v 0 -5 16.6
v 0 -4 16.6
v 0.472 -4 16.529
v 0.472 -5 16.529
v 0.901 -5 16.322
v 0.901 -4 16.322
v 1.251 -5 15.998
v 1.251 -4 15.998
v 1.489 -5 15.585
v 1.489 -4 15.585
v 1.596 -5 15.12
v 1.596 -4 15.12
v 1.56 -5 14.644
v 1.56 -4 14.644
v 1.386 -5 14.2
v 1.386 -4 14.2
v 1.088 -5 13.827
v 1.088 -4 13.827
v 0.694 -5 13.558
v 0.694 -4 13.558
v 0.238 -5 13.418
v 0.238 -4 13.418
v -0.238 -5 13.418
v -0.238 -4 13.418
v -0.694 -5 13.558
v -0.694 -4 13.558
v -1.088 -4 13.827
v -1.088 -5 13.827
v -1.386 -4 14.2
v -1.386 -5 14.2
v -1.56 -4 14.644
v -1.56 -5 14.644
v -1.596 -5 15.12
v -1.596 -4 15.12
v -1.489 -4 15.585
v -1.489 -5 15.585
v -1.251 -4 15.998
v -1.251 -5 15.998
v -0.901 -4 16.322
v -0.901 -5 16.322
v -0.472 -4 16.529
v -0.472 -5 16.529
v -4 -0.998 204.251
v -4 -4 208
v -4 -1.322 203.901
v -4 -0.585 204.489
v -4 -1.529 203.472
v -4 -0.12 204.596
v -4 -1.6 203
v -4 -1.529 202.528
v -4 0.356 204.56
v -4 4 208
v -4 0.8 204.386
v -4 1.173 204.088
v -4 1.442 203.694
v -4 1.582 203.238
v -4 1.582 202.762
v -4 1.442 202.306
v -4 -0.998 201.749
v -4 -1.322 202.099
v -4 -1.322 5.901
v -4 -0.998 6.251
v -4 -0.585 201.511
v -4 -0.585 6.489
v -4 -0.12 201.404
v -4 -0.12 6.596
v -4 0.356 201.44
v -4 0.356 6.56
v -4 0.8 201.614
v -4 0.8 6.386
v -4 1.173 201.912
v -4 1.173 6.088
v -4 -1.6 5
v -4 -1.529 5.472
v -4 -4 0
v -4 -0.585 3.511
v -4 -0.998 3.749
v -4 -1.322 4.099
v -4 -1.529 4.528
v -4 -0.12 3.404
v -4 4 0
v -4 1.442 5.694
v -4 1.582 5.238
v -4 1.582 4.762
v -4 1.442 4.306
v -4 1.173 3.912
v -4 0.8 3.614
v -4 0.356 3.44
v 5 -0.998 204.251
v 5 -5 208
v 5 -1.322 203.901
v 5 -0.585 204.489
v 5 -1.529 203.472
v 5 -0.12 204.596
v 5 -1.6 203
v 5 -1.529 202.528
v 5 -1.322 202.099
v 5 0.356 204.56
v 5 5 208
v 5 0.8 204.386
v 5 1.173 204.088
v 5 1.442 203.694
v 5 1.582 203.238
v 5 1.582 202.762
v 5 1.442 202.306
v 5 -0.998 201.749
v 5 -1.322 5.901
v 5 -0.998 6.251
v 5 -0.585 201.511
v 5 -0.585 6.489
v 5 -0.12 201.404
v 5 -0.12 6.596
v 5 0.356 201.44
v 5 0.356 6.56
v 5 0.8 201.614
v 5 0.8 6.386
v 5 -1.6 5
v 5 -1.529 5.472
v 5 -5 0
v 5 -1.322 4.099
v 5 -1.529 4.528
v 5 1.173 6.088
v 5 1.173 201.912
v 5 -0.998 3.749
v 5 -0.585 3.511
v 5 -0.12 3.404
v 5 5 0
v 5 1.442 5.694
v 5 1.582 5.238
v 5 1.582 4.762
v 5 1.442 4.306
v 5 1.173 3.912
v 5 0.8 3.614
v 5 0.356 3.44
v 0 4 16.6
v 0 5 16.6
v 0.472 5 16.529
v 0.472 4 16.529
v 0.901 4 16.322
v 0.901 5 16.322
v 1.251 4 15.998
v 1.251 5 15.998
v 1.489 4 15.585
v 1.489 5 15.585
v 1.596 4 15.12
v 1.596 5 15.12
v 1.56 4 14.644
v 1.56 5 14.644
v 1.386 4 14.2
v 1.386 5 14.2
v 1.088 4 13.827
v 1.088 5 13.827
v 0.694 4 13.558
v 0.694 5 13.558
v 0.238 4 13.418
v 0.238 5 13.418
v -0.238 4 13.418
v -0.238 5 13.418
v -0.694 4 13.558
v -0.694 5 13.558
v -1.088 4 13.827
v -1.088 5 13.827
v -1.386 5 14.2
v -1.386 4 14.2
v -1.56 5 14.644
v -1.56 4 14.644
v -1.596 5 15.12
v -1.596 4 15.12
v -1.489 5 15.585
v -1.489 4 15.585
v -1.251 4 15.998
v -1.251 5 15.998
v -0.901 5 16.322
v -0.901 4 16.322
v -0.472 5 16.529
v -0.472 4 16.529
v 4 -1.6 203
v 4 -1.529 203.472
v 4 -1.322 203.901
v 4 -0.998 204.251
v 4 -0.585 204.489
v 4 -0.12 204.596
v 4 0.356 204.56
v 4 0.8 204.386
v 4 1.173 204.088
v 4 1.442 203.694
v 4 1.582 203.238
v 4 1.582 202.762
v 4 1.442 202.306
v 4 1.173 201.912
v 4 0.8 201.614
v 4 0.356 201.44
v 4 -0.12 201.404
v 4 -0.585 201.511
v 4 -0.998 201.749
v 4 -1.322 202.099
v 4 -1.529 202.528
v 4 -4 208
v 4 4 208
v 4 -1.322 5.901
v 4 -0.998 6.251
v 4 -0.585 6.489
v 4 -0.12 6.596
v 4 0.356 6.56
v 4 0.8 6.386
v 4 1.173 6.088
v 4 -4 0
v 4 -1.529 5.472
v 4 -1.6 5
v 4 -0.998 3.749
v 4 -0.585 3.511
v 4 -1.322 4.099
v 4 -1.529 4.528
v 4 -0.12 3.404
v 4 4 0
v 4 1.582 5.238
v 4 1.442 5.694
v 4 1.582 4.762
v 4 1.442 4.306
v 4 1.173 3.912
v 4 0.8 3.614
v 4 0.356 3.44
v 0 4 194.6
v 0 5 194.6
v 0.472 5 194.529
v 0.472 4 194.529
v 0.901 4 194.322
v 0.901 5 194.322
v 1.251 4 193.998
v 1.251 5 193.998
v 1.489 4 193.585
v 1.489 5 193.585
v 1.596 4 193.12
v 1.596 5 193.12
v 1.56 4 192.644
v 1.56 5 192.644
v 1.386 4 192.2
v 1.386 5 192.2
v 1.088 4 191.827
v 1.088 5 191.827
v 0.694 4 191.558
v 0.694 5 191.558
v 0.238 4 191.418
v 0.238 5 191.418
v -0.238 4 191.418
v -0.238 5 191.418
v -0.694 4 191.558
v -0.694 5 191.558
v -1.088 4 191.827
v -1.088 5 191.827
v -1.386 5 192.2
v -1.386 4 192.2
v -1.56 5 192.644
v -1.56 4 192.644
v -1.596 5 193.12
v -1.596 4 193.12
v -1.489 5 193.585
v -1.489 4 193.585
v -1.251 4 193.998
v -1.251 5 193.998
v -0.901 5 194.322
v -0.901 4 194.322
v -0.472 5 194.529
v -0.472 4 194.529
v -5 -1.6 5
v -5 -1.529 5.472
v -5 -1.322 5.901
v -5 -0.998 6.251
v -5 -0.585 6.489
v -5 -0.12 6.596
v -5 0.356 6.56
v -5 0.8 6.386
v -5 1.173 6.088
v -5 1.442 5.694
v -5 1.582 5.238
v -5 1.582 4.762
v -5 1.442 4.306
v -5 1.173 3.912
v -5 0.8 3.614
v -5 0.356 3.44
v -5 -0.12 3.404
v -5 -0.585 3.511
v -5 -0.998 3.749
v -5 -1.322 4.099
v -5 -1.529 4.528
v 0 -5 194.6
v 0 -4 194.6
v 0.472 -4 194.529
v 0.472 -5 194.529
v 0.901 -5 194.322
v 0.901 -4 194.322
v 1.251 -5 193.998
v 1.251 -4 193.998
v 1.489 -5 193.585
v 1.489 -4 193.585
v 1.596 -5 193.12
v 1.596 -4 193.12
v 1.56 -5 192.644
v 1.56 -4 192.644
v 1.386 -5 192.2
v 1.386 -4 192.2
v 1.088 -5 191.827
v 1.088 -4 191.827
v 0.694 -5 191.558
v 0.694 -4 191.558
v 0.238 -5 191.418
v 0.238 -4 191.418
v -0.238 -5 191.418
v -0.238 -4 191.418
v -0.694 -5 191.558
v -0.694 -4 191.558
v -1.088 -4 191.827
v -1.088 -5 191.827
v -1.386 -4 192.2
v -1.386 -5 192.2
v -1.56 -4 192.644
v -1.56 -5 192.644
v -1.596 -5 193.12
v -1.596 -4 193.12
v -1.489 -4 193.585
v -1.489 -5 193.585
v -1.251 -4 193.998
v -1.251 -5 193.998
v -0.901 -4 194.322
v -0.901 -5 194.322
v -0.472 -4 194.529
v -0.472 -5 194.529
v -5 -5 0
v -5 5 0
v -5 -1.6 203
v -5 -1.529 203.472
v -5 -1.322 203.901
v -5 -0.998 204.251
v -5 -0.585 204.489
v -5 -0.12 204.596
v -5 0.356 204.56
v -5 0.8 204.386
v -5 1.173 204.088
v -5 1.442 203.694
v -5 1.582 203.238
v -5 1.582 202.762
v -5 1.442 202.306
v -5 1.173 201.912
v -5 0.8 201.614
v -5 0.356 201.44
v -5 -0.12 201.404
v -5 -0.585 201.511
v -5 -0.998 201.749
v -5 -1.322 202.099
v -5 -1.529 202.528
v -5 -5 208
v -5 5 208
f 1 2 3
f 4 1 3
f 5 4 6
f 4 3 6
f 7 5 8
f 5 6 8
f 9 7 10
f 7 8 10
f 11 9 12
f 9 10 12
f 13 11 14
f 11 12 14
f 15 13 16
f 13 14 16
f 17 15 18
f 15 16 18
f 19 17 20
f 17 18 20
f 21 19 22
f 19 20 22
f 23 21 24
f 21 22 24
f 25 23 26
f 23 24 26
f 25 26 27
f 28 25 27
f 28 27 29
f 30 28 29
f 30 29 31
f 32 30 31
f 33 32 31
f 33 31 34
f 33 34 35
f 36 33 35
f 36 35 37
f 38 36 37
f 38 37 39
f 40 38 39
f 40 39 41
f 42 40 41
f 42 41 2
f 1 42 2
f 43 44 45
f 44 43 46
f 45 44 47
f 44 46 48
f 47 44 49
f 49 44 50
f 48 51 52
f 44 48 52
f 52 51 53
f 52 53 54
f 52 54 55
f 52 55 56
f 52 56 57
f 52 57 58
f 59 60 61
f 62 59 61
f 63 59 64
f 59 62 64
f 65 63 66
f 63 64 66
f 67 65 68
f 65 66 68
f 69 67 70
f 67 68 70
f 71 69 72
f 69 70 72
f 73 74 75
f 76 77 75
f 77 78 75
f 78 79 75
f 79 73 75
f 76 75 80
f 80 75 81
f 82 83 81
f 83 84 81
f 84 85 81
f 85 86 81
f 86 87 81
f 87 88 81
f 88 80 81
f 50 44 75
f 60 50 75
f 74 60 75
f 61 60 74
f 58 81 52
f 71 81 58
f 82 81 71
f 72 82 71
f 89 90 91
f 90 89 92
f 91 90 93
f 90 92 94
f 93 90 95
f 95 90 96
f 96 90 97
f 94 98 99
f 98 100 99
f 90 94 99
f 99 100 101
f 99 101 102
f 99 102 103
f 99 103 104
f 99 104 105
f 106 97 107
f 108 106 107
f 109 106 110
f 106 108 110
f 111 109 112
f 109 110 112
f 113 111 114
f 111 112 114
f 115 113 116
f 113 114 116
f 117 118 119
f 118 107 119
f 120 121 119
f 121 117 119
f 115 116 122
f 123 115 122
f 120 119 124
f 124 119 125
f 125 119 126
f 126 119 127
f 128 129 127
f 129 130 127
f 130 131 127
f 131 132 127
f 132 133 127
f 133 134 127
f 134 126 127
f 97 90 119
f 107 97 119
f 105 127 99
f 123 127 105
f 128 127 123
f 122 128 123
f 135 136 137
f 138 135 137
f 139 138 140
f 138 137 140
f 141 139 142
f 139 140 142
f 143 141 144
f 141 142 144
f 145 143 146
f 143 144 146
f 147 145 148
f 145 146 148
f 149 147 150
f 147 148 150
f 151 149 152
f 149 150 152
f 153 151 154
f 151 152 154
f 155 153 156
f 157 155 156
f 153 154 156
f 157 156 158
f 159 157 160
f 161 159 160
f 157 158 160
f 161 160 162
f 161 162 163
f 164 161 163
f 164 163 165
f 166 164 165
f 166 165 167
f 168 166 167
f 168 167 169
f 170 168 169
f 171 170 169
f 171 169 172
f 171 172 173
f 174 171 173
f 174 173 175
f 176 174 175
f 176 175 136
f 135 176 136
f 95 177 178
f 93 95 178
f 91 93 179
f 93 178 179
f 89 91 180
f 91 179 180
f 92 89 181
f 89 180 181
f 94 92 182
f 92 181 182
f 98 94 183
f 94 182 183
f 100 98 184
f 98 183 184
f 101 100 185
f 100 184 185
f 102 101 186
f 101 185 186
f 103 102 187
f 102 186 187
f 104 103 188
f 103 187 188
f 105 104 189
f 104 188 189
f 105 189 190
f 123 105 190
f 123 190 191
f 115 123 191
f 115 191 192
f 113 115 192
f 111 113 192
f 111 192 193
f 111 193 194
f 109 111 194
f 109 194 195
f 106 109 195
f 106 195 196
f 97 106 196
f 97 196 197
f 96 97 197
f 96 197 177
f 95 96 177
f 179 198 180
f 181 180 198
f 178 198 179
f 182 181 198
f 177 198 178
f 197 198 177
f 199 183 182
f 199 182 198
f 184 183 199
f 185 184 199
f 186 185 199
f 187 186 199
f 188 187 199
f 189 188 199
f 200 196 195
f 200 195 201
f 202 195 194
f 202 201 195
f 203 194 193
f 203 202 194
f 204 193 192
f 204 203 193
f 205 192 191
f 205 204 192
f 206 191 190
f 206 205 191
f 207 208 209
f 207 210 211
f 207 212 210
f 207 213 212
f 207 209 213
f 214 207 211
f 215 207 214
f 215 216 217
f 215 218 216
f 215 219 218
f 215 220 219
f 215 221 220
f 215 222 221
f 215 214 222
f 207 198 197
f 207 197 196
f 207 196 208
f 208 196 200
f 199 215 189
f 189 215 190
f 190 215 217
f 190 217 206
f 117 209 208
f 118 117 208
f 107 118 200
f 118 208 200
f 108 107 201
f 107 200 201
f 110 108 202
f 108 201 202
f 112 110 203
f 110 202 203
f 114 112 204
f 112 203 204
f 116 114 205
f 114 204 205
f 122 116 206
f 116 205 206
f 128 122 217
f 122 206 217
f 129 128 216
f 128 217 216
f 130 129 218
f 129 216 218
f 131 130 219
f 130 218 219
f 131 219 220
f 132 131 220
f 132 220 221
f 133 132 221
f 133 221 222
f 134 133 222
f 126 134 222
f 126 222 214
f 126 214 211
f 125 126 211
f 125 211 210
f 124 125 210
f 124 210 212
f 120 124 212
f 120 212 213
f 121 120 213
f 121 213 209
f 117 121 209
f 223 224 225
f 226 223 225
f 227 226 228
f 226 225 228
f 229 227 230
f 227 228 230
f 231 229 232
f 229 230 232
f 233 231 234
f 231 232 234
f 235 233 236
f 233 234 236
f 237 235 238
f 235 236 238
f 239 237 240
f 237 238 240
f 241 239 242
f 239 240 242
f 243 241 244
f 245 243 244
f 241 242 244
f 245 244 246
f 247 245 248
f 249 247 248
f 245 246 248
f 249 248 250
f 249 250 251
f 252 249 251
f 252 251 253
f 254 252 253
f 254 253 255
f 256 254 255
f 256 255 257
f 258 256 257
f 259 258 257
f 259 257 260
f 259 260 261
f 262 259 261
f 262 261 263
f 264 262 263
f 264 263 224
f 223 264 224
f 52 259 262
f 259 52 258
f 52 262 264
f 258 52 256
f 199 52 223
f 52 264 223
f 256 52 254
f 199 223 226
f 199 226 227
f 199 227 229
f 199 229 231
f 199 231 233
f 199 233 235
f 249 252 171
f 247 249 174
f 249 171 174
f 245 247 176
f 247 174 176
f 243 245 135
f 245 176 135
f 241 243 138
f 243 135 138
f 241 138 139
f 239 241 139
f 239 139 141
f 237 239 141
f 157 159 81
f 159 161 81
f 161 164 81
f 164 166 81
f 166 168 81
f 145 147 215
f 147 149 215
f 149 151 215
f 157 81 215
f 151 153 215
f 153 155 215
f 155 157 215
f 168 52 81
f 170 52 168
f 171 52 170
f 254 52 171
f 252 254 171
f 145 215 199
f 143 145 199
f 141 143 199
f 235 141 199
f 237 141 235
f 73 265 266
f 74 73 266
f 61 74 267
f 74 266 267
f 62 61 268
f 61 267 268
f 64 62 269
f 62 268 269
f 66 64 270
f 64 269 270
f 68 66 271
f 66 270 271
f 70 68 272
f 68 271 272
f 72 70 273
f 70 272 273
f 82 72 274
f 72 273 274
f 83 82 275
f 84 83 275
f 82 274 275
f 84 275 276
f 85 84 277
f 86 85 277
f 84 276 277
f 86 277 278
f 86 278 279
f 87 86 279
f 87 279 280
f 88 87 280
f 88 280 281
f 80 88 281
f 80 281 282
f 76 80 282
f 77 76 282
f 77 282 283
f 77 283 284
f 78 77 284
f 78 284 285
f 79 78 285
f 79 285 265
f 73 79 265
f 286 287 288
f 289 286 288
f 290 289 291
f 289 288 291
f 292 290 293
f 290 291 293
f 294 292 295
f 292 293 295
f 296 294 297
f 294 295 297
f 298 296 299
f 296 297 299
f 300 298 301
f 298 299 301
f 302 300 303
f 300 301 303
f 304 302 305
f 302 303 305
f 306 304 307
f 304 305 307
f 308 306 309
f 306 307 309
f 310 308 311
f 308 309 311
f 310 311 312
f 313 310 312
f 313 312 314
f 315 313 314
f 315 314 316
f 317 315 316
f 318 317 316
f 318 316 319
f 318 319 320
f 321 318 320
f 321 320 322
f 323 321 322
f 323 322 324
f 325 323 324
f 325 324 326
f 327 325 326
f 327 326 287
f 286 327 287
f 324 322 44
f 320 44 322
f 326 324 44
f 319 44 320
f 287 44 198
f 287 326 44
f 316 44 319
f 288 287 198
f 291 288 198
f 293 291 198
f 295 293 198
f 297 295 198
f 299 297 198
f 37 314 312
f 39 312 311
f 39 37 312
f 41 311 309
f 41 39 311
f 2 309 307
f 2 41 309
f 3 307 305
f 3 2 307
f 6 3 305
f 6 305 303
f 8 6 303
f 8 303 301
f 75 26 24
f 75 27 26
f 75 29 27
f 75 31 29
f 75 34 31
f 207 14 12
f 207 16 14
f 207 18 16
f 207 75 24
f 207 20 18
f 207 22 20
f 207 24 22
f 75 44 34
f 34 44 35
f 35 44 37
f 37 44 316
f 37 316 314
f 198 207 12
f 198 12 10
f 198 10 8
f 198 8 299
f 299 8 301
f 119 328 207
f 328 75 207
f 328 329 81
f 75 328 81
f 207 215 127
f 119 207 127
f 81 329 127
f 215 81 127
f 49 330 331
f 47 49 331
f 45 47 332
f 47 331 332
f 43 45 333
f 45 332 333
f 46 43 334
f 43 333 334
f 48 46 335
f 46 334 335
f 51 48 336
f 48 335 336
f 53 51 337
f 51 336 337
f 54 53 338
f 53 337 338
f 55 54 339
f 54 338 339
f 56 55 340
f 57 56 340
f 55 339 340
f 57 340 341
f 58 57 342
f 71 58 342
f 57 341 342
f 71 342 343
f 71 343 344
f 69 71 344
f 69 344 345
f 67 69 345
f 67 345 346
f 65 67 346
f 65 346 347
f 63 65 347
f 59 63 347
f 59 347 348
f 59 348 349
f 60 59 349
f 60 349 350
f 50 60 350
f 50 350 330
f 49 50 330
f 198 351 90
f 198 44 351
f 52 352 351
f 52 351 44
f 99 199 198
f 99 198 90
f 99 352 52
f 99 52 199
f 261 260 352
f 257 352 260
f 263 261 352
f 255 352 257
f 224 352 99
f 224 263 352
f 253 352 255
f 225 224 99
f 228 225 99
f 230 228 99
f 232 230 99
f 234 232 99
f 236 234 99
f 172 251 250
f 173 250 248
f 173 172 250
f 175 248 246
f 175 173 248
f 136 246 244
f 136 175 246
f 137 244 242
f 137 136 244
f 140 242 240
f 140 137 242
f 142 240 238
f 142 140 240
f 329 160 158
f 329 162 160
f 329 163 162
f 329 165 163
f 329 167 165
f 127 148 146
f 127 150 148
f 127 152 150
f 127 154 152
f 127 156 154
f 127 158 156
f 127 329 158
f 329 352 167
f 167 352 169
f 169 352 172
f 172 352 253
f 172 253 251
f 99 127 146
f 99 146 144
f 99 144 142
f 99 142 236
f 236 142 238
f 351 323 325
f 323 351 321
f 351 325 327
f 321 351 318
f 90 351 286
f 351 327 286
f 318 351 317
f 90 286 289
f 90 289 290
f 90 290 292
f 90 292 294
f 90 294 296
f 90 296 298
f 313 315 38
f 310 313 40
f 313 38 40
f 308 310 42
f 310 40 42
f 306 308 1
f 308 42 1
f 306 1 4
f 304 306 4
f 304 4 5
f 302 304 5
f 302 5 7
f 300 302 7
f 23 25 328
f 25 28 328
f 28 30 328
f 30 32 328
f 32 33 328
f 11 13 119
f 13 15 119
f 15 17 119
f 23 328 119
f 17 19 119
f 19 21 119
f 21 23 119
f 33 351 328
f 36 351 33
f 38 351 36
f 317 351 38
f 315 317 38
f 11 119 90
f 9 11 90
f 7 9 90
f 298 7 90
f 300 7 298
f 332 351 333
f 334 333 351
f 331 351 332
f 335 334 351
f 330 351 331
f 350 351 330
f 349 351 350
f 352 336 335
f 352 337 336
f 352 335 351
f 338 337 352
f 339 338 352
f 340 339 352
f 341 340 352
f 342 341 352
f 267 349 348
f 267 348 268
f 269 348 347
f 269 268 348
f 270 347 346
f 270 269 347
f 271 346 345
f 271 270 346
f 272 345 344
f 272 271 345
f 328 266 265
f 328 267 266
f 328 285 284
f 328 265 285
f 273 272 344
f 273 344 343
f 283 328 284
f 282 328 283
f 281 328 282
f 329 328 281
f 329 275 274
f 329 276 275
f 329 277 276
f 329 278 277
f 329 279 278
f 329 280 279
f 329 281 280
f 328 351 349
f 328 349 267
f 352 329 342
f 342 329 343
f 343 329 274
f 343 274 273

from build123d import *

# Parameters (mm, degrees)
SKETCH_1_W          = 10
SKETCH_1_H          = 10
SKETCH_1_W_2        = 8
SKETCH_1_H_2        = 8
EXTRUDE_1_DEPTH     = 208
SKETCH_2_R          = 1.6
CUT_EXTRUDE_1_DEPTH = 209.300264042
SKETCH_3_R          = 1.6
CUT_EXTRUDE_2_DEPTH = 209.300264042


with BuildPart() as part:
    # ｽｹｯﾁ1 → ﾎﾞｽ - 押し出し1 (new body)
    with BuildSketch(Plane.XY):
        Rectangle(SKETCH_1_W, SKETCH_1_H)
        Rectangle(SKETCH_1_W_2, SKETCH_1_H_2, mode=Mode.SUBTRACT)
    extrude(amount=EXTRUDE_1_DEPTH)

    # ｽｹｯﾁ2 → ｶｯﾄ - 押し出し1 (cut, through all)
    with BuildSketch(Plane(origin=(0, 5, 0), x_dir=(1, 0, 0), z_dir=(0, 1, 0))):
        with Locations(Location((0, -193, 0), (0, 0, 270))):
            Circle(SKETCH_2_R)
        with Locations(Location((0, -15, 0), (0, 0, 270))):
            Circle(SKETCH_2_R)
    extrude(amount=-CUT_EXTRUDE_1_DEPTH, mode=Mode.SUBTRACT)

    # ｽｹｯﾁ3 → ｶｯﾄ - 押し出し2 (cut, through all)
    with BuildSketch(Plane.ZY.offset(5)):
        with Locations(Location((203, 0, 0), (0, 0, 270))):
            Circle(SKETCH_3_R)
        with Locations(Location((5, 0, 0), (0, 0, 270))):
            Circle(SKETCH_3_R)
    extrude(amount=-CUT_EXTRUDE_2_DEPTH, mode=Mode.SUBTRACT)


solid = part.part
